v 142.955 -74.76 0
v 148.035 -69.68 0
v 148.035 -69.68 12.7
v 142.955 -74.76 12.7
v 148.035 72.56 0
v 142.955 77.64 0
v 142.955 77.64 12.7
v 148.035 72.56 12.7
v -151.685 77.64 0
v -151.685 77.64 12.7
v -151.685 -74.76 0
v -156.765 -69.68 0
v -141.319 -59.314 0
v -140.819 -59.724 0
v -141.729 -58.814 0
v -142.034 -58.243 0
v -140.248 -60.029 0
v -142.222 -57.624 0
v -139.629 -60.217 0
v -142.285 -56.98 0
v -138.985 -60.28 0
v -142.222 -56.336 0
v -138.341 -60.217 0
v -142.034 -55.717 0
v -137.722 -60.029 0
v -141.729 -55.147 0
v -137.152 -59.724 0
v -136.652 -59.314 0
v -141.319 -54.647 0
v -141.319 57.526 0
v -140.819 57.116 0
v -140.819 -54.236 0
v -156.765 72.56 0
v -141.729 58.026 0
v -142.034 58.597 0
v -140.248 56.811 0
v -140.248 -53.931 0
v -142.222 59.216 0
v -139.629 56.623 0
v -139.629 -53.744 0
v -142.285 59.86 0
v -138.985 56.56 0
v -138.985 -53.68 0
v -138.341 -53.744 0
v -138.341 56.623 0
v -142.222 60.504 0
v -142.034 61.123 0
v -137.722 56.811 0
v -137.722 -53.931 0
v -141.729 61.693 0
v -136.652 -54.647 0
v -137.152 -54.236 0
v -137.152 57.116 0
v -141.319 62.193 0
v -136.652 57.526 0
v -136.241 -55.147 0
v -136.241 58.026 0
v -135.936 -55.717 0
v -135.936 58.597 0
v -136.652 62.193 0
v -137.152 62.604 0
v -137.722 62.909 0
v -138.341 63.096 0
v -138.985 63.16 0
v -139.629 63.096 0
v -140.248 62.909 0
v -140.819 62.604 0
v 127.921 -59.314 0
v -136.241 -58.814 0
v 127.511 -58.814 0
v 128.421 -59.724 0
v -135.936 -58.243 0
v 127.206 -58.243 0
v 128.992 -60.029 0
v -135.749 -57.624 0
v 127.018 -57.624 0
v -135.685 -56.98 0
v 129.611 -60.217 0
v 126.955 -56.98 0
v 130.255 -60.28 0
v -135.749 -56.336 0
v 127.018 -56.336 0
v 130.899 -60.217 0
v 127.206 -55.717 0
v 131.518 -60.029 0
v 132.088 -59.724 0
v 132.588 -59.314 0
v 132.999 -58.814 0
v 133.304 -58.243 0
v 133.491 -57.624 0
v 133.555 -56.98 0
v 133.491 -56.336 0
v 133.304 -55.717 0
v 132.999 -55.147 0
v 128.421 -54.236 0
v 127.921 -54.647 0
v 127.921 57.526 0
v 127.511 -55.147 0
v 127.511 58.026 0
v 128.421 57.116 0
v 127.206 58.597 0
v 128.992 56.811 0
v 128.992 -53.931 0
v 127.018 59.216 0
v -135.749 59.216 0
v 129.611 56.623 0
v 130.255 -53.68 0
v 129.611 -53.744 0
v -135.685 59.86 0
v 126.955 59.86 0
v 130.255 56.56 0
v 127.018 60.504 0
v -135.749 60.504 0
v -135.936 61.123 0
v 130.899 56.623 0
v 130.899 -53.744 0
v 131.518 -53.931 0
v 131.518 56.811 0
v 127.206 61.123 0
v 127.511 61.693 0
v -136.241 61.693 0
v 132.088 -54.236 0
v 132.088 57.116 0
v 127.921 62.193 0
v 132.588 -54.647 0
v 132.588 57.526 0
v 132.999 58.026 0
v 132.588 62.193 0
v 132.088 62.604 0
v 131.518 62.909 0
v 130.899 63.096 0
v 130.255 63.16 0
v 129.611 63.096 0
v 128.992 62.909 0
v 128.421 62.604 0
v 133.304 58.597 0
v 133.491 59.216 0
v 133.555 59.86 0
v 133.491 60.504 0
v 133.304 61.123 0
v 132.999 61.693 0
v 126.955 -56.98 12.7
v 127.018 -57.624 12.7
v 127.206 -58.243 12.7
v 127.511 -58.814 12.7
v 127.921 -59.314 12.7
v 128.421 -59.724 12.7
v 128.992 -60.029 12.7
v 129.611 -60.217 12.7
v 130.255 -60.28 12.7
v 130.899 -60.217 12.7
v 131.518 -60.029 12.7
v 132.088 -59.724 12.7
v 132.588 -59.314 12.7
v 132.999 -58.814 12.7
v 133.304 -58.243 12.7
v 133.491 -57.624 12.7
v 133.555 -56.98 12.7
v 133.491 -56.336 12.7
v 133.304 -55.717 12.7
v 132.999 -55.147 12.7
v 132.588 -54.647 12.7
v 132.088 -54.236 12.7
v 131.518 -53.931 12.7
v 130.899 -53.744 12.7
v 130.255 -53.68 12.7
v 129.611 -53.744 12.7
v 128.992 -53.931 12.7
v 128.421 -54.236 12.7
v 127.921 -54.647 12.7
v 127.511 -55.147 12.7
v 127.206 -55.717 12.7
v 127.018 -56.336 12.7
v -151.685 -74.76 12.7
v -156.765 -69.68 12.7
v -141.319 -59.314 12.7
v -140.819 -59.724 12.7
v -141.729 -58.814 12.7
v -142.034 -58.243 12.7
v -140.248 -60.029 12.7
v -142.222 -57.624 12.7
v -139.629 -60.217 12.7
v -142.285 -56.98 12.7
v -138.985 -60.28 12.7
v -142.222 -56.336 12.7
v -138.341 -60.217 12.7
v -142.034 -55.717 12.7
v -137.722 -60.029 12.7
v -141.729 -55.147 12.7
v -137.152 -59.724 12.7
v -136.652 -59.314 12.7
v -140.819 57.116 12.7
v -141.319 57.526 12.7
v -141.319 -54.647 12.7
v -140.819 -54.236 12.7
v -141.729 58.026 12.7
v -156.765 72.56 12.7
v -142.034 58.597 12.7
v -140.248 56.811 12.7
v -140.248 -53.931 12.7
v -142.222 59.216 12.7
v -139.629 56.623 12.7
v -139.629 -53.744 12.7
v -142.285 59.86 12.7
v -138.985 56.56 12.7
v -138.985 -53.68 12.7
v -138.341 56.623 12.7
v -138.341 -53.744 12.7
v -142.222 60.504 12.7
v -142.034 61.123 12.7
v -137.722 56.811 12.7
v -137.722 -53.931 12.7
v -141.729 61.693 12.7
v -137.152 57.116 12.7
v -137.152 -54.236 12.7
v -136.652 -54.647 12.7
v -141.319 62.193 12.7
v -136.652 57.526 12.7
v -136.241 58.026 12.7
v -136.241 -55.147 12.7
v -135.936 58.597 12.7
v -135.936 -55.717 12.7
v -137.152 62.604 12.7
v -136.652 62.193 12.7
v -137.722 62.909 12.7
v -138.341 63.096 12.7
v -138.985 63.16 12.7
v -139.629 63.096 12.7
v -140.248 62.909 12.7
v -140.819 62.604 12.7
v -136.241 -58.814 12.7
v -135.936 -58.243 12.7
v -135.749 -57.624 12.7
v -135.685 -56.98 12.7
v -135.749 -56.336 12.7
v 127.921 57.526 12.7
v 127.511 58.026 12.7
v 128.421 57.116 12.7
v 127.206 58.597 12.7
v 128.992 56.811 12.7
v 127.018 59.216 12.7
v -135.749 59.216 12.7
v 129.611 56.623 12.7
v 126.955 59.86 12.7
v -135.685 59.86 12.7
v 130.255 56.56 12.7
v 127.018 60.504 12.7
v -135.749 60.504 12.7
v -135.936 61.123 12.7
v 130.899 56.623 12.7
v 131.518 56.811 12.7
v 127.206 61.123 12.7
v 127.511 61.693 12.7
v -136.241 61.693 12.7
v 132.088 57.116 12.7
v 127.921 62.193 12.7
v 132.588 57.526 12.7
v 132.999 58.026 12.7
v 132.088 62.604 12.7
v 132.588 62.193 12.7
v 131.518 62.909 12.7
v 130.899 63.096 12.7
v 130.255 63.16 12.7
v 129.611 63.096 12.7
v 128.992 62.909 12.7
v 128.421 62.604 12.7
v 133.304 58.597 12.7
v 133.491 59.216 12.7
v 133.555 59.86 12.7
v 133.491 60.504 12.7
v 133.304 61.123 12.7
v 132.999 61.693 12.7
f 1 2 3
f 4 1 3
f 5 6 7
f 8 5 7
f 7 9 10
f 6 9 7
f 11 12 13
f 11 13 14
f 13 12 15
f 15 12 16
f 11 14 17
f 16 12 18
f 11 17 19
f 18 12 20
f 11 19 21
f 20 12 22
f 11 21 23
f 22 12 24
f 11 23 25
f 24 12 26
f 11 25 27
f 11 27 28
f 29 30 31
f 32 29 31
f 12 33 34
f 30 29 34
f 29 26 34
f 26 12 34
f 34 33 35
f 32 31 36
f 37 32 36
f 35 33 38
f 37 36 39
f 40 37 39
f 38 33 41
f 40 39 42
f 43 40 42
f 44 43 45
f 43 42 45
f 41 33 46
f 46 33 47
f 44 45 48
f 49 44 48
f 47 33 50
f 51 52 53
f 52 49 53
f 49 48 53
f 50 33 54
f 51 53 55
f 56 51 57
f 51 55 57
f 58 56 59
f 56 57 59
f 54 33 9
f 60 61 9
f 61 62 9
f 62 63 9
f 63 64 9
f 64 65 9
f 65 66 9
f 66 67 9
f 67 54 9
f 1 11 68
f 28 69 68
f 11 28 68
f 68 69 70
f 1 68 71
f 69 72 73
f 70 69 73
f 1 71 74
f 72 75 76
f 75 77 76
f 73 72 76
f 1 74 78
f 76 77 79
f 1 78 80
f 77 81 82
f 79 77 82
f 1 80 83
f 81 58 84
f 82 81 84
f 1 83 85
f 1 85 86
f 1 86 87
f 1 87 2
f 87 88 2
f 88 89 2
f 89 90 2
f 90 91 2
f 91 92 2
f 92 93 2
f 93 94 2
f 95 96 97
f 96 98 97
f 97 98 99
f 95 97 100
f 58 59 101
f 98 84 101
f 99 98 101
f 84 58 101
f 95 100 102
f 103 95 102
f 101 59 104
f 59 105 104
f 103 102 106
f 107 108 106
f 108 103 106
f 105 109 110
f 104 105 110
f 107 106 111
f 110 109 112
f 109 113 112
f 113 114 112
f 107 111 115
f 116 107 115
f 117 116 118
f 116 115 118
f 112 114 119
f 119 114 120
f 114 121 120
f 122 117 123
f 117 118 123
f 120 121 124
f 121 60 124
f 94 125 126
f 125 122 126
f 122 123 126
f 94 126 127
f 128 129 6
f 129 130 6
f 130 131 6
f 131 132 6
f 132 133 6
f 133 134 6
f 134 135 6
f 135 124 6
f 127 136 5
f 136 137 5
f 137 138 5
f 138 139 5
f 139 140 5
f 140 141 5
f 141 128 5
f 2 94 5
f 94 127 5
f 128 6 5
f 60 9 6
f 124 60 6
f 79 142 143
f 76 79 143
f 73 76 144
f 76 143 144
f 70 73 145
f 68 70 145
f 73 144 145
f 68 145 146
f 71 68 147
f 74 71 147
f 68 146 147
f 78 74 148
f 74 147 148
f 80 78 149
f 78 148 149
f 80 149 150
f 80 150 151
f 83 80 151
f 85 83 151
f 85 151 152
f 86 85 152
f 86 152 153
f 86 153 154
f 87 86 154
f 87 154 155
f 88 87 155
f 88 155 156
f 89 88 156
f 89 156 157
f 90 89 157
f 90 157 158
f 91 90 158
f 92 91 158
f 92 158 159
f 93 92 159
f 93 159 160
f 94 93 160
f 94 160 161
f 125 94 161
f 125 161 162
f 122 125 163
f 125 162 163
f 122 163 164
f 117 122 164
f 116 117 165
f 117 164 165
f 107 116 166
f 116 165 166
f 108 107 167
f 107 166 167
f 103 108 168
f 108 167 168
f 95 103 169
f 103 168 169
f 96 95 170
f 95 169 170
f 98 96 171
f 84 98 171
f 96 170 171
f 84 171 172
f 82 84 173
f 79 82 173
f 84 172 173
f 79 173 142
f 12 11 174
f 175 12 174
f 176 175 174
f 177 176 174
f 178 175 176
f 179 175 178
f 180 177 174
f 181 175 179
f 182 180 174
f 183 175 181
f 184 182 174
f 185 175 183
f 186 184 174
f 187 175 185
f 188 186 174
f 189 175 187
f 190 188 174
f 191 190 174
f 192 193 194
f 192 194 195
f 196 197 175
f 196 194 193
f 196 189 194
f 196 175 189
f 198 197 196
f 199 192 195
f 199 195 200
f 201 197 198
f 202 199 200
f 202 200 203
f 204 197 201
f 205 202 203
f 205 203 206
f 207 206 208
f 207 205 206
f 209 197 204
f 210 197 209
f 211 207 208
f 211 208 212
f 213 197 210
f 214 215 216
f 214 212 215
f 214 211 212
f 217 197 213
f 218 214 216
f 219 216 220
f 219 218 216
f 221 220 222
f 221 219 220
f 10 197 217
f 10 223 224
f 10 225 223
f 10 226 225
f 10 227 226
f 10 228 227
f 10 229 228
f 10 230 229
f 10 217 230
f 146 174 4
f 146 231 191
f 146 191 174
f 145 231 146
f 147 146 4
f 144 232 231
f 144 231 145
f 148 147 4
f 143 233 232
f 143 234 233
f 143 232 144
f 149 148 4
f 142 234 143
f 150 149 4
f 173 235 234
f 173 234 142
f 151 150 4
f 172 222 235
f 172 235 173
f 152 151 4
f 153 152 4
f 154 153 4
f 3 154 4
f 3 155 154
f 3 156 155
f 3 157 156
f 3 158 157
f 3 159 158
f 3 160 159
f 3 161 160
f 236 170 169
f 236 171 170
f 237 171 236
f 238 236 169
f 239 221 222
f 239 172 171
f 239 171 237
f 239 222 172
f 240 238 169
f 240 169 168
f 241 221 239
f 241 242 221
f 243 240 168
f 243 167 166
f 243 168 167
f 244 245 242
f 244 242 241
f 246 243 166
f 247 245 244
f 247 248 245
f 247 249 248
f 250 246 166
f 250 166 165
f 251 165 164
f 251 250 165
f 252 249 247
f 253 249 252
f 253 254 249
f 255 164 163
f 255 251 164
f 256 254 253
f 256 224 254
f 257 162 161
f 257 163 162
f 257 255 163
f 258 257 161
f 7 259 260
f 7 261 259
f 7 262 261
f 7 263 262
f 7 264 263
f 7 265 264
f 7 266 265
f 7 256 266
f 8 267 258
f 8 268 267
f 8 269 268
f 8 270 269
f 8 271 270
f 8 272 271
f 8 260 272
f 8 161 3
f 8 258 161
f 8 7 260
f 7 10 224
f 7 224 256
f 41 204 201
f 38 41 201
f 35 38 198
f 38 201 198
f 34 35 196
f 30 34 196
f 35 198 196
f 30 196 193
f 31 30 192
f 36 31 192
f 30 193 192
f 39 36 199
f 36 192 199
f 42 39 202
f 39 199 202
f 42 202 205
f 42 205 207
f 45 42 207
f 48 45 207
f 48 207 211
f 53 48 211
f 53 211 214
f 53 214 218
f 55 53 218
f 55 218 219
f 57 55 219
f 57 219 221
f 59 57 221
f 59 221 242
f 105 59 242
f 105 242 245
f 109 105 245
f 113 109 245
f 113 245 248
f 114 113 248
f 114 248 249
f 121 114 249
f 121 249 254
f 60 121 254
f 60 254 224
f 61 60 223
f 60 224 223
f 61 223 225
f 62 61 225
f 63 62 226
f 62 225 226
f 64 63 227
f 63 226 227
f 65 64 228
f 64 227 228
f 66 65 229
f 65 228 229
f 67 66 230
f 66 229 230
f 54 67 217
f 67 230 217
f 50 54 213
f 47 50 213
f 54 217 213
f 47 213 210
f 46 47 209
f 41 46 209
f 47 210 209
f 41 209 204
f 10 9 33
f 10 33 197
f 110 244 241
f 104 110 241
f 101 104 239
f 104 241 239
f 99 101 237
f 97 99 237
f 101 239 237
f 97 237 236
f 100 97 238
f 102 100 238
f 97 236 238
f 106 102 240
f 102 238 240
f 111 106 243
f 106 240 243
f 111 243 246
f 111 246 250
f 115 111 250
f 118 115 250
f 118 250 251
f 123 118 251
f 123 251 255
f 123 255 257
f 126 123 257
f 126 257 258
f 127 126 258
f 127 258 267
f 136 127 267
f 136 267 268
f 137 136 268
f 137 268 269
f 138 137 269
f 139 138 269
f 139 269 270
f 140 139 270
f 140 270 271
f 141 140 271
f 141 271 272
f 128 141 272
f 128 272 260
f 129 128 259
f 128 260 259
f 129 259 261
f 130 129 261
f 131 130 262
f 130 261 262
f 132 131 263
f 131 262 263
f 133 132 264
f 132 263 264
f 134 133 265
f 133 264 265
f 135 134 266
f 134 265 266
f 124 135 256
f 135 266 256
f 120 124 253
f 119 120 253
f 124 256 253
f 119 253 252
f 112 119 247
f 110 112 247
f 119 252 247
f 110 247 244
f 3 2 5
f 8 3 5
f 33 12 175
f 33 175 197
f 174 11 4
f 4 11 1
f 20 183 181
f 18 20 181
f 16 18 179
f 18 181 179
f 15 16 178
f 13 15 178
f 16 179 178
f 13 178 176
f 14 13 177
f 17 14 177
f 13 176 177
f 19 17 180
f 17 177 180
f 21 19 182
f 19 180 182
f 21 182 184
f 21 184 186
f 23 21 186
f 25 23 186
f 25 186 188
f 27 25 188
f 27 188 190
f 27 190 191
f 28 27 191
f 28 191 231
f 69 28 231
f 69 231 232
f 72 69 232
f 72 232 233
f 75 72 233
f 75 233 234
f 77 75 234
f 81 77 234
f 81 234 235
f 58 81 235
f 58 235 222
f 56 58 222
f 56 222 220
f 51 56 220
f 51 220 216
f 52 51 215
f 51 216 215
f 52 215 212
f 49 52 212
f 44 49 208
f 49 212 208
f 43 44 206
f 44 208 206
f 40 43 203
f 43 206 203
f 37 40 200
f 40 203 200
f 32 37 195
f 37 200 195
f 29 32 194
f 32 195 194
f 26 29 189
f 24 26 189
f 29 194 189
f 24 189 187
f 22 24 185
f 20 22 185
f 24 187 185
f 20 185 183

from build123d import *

# Parameters (mm, degrees)
F0_W     = 304.8
F0_H     = 152.4
F1_DEPTH = 12.7
F2_SIZE  = 5.08
F4_D     = 6.6


with BuildPart() as f1:
    # F0 (on Top) → F1 (new body)
    with BuildSketch(Plane.XY):
        with Locations((-4.3651189959, 1.439737156)):
            Rectangle(F0_W, F0_H)
    extrude(amount=F1_DEPTH)

    # F2
    f2_edges = [f1.edges().sort_by_distance(p)[0] for p in [
        (148.034881, -74.760263, 6.35),
        (148.034881, 77.639737, 6.35),
        (-156.765119, 77.639737, 6.35),
        (-156.765119, -74.760263, 6.35),
    ]]
    chamfer(f2_edges, length=F2_SIZE)

    # F4 (through all)
    with Locations(Plane(origin=(0, 0, 0), x_dir=(1, 0, 0), z_dir=(0, 0, -1))):
        with Locations((-138.9851189959, -59.859737156), (-138.9851189959, 56.980262844), (130.2548810041, 56.980262844), (130.2548810041, -59.859737156)):
            Hole(F4_D / 2)


solid = f1.part
